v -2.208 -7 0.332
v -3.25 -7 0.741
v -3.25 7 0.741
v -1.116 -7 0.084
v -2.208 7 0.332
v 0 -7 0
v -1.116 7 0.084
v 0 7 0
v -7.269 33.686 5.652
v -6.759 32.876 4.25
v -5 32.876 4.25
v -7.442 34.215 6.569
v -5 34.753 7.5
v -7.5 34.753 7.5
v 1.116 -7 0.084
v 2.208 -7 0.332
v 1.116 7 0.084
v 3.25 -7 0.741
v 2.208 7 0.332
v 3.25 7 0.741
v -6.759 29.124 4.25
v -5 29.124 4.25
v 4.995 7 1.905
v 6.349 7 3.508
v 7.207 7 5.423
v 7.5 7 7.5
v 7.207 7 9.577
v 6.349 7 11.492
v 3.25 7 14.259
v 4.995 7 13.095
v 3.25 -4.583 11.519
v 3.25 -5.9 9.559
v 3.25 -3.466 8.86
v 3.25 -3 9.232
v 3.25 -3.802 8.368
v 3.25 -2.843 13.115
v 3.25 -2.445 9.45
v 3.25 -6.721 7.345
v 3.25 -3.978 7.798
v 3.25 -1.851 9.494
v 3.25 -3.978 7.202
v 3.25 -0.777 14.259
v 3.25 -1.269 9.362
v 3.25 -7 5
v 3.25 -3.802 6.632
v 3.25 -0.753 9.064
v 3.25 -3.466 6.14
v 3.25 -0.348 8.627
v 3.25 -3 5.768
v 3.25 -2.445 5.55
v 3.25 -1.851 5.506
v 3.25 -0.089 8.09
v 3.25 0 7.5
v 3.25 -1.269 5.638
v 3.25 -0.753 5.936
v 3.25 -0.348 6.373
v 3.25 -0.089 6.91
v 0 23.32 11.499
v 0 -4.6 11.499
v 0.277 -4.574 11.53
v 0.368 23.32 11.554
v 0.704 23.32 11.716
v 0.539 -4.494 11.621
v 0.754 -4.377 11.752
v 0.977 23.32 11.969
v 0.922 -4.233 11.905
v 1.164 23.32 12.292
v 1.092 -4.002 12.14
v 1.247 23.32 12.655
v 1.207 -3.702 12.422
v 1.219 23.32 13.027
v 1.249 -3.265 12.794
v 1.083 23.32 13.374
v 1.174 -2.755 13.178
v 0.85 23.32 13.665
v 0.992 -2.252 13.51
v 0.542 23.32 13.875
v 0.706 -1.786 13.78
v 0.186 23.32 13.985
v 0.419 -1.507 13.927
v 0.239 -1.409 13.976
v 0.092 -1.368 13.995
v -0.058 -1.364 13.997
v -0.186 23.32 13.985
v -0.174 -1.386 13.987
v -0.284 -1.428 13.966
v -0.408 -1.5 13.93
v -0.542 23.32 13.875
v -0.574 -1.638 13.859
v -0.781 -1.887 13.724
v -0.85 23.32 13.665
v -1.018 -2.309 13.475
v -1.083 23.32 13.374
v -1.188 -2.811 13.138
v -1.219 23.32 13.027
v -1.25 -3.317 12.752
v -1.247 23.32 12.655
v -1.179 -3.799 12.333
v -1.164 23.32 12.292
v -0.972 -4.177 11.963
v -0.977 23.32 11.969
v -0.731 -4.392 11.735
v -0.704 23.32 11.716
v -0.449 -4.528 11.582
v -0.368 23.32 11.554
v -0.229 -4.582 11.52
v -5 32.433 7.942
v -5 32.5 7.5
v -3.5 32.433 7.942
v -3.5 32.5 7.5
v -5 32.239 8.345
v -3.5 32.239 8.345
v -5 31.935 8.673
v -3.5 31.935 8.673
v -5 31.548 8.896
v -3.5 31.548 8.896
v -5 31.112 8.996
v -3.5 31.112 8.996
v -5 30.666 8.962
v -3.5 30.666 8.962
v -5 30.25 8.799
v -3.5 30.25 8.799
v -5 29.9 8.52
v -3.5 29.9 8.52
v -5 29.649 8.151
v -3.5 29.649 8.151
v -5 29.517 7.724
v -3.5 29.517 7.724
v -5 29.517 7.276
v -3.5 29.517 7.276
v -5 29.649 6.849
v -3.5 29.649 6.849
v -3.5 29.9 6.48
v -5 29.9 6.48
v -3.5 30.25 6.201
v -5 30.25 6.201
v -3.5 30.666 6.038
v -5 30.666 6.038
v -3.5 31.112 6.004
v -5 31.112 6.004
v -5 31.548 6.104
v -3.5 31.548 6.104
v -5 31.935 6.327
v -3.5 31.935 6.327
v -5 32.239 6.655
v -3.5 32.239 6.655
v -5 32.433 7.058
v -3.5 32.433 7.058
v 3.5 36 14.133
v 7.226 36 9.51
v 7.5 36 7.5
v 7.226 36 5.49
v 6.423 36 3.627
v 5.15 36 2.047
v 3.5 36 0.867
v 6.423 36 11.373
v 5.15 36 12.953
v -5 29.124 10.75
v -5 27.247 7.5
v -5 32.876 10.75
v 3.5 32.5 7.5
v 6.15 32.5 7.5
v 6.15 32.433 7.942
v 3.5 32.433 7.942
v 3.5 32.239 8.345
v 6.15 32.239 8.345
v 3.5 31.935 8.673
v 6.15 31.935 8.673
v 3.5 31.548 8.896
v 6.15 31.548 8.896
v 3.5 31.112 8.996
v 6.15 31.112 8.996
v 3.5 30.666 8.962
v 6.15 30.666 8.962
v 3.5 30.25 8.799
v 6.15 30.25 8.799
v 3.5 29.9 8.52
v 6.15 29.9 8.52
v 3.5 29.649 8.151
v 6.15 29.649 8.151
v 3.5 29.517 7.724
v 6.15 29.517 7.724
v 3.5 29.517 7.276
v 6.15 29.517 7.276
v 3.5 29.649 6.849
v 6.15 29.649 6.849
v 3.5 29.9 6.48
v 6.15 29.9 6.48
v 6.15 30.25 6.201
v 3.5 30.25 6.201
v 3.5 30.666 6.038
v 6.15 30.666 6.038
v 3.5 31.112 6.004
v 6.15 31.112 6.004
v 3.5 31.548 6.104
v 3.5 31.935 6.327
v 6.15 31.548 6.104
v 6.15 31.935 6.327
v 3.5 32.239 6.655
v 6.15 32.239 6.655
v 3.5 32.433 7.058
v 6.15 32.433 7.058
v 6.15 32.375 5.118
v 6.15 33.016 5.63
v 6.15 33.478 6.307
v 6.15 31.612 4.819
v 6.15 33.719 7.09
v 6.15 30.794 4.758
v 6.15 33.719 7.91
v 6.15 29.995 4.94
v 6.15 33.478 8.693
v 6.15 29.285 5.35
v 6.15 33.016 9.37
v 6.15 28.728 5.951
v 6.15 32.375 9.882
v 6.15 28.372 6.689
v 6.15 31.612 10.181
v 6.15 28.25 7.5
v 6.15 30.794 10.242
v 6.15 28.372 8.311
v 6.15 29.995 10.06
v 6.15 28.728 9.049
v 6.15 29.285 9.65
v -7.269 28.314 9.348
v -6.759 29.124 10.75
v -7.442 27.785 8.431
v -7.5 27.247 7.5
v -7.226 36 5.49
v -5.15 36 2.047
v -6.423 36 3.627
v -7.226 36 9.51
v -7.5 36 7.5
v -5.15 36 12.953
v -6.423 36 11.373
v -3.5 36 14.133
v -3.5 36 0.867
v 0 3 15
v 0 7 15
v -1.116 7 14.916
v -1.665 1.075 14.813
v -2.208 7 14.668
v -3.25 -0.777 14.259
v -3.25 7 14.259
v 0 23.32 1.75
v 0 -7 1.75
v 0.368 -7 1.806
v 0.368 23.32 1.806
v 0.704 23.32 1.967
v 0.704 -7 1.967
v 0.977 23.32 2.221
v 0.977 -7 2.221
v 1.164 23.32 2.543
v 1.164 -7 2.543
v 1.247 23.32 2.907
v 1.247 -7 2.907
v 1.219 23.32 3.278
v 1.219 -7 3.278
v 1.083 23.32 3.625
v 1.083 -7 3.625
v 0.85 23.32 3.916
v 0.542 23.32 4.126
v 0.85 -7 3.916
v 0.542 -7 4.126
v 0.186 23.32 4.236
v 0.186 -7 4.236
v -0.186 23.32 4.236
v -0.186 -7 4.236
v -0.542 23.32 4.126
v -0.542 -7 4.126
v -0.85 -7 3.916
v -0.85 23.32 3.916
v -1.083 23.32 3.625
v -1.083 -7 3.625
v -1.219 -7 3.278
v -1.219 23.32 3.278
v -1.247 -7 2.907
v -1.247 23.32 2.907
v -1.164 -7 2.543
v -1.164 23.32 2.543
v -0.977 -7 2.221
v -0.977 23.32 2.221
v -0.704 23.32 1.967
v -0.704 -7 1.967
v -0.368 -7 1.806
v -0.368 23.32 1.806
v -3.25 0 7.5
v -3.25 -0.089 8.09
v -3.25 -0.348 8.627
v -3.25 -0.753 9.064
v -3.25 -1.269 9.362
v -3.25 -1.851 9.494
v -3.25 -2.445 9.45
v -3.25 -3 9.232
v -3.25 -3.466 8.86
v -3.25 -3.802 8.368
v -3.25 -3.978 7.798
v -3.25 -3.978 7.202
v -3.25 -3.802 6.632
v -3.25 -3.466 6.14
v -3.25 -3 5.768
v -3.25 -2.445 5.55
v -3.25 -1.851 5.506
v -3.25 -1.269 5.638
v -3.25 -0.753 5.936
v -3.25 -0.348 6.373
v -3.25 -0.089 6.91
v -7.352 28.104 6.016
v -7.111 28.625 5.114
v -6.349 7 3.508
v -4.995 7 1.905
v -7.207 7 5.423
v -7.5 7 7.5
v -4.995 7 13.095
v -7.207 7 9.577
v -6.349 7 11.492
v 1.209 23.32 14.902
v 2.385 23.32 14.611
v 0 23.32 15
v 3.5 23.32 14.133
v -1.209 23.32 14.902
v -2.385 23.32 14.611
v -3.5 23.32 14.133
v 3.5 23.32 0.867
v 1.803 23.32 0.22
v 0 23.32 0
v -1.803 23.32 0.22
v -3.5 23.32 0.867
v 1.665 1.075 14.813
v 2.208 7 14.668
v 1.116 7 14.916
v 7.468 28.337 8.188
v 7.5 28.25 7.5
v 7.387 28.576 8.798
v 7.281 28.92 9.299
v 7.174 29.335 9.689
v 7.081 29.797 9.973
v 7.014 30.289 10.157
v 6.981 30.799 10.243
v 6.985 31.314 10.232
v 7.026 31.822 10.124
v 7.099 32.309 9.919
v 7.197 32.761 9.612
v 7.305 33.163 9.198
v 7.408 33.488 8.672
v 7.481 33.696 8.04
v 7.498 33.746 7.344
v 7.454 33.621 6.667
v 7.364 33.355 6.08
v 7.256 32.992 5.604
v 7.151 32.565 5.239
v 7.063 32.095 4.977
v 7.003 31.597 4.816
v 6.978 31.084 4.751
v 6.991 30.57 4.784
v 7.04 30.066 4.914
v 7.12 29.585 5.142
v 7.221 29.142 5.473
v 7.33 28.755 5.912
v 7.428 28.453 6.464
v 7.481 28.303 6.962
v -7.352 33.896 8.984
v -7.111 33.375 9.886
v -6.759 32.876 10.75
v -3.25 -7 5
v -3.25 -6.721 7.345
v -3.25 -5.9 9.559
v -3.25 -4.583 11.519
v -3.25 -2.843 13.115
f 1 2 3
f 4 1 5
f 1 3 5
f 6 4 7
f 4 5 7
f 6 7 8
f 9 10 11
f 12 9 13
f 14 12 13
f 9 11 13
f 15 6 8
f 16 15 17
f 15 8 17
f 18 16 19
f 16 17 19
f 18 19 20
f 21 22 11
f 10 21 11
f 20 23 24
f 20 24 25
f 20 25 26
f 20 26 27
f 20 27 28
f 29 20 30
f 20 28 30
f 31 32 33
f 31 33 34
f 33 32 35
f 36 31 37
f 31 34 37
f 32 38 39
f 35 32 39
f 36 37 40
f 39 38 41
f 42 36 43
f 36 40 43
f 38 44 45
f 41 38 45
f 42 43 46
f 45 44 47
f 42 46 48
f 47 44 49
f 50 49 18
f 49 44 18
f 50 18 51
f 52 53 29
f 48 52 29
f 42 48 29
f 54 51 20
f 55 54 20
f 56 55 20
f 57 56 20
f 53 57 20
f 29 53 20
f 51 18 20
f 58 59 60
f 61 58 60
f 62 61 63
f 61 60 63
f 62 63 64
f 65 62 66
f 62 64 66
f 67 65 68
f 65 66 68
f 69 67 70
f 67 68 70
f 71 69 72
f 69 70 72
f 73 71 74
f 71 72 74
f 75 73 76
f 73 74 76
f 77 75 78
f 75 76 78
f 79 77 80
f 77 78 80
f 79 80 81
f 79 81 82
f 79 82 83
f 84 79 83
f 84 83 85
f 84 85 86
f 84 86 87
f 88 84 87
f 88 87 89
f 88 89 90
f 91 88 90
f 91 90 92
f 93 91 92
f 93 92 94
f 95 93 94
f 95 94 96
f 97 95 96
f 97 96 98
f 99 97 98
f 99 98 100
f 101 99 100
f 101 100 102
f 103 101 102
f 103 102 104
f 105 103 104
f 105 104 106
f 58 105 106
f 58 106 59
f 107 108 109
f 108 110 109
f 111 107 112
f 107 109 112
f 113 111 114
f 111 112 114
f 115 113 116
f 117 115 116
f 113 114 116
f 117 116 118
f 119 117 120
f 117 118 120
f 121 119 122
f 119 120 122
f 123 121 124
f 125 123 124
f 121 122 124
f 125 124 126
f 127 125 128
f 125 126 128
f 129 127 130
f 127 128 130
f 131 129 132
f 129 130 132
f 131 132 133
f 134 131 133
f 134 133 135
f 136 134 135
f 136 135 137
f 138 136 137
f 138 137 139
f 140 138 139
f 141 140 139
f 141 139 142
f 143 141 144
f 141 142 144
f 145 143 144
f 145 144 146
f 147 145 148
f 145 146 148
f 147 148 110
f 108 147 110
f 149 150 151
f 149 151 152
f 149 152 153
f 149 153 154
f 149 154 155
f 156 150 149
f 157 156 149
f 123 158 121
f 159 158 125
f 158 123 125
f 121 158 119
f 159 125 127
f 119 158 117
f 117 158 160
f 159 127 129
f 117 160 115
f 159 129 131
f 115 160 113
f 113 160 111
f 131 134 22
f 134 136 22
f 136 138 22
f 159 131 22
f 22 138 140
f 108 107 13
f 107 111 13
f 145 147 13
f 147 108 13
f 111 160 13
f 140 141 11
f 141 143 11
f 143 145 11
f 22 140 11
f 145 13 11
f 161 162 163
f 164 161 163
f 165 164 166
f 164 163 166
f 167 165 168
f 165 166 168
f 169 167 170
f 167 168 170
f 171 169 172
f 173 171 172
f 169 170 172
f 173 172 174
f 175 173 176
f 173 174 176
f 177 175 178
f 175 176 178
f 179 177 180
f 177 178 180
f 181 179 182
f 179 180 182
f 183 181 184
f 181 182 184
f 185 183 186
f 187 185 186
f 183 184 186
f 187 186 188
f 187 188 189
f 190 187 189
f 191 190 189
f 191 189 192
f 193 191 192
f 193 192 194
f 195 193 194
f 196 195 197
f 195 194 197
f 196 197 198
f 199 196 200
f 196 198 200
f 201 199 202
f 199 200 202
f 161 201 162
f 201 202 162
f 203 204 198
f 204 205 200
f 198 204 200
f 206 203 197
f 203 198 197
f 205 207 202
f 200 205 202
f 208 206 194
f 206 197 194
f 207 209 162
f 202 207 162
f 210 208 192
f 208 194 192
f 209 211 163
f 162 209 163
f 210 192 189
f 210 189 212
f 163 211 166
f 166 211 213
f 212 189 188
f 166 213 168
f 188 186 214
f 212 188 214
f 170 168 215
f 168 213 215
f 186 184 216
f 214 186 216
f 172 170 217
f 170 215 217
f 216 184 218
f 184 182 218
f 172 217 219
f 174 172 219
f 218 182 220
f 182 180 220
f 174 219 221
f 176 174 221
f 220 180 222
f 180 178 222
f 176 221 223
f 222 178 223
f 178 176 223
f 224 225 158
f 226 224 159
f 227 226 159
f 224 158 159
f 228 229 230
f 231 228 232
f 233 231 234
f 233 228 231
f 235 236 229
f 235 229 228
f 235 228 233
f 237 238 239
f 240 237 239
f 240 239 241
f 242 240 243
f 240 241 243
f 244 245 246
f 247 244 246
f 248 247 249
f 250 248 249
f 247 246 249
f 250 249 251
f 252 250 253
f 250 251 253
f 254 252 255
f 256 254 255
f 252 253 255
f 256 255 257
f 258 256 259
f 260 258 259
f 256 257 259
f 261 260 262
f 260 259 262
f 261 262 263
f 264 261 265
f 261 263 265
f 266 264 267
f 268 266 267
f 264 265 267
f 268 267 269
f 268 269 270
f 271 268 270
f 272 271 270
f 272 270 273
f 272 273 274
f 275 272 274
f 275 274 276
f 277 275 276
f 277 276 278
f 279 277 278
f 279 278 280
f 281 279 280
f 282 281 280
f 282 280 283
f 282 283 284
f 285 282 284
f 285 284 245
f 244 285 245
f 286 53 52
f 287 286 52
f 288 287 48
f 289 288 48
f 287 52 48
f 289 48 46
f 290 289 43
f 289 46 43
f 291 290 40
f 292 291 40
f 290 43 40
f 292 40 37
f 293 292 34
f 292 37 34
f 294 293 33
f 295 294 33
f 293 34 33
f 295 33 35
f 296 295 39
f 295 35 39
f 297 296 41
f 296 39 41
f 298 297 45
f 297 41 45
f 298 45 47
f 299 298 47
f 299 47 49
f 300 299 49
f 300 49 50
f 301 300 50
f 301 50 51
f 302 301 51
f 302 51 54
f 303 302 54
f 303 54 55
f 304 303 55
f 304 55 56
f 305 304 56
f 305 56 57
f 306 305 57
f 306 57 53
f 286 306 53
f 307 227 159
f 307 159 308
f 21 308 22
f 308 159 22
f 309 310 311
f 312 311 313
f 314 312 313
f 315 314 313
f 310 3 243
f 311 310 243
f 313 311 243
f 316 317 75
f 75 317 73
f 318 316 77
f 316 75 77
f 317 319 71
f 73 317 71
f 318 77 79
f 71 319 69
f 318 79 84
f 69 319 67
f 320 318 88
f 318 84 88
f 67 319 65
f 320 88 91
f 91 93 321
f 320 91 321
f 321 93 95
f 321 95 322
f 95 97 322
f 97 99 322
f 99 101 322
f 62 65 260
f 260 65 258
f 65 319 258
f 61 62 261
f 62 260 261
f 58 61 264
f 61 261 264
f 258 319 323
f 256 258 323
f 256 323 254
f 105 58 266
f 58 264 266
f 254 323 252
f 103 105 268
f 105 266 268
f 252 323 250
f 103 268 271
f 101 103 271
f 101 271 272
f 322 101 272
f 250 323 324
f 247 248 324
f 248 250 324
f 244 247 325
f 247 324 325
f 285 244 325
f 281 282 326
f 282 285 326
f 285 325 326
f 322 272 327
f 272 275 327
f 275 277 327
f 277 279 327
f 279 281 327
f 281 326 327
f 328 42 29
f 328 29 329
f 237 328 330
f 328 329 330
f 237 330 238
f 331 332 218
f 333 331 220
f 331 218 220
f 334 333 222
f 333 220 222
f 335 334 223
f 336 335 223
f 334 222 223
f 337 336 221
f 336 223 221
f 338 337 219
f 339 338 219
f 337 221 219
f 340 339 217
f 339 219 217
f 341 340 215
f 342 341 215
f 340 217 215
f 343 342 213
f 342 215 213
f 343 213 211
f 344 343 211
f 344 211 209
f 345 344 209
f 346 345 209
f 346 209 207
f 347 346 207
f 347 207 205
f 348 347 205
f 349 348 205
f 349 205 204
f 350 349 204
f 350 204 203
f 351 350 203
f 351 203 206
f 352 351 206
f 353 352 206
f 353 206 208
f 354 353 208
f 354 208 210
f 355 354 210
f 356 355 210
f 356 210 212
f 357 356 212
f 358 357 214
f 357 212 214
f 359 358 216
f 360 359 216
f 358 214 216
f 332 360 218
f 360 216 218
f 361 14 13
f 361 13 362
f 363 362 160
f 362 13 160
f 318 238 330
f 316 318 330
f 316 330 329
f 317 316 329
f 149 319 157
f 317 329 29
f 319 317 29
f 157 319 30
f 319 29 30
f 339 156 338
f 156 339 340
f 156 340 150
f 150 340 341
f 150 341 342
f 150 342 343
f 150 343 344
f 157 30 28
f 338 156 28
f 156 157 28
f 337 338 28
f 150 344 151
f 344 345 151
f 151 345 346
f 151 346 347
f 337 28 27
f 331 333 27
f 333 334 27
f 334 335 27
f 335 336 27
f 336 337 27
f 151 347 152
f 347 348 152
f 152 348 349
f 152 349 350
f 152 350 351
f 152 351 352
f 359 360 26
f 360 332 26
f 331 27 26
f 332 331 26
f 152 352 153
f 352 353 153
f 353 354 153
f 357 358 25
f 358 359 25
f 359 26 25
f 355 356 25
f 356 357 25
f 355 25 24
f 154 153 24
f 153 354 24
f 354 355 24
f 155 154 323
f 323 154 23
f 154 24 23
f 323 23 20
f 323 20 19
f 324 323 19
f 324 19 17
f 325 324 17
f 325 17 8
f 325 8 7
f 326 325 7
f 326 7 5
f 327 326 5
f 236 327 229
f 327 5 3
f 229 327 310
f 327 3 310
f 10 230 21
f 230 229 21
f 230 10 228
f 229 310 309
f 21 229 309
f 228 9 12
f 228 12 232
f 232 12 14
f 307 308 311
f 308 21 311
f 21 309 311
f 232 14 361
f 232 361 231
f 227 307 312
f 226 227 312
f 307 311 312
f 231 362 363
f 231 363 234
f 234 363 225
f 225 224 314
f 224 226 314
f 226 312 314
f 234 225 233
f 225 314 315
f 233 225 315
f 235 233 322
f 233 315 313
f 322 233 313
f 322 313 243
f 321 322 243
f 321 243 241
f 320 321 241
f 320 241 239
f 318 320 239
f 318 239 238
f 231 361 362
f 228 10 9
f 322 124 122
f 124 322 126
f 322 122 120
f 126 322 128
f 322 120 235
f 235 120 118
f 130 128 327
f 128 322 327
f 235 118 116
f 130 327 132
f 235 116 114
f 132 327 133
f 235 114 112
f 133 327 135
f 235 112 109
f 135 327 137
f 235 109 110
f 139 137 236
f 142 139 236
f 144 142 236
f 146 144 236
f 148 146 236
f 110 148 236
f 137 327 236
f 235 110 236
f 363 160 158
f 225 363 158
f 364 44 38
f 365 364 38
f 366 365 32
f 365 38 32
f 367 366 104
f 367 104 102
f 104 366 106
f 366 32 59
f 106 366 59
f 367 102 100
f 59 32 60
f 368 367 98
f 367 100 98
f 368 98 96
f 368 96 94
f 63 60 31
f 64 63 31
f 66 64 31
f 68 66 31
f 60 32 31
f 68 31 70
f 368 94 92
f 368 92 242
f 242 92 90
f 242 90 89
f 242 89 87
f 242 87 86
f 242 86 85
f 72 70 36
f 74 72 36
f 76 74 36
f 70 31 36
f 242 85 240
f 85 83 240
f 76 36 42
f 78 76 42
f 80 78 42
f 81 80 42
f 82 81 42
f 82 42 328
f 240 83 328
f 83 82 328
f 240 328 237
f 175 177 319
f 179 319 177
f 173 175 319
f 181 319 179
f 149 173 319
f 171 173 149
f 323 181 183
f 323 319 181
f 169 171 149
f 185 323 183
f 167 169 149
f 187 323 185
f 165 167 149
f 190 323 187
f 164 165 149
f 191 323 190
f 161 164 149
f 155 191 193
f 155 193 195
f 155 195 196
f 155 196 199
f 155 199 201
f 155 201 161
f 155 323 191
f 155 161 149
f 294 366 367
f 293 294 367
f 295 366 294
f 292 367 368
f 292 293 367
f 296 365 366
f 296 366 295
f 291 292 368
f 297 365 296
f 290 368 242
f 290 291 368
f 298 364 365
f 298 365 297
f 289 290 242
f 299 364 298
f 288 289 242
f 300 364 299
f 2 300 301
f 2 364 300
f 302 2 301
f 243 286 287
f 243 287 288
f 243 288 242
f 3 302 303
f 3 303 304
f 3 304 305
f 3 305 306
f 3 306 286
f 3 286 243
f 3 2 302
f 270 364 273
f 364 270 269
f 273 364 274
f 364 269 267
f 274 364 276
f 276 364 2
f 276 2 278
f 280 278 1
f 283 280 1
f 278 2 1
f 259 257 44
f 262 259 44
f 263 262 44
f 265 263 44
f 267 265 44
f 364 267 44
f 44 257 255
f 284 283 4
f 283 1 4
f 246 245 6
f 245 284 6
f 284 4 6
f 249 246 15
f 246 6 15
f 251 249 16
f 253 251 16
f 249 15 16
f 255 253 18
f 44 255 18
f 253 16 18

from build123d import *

# Parameters (mm, degrees)
SKETCH1_W           = 6.5
SKETCH1_H           = 14
BOSS_EXTRUDE1_DEPTH = 15
FILLET1_R           = 10
SKETCH2_R           = 2
CUT_EXTRUDE1_DEPTH  = 18.783419244
SKETCH4_R           = 7.5
BOSS_EXTRUDE2_DEPTH = 29
SKETCH6_W           = 7
SKETCH6_H           = 12.68
CUT_EXTRUDE2_DEPTH  = 40.714606885
CUT_EXTRUDE3_DEPTH  = 34.5
SKETCH8_R           = 1.5
CUT_EXTRUDE4_DEPTH  = 21
SKETCH9_R           = 2.75
CUT_EXTRUDE5_DEPTH  = 10
CUT_EXTRUDE6_DEPTH  = 10
SKETCH11_R          = 1.25
CUT_EXTRUDE7_DEPTH  = 40


with BuildPart() as part:
    # Sketch1 → Boss-Extrude1 (new body)
    with BuildSketch(Plane.XY):
        Rectangle(SKETCH1_W, SKETCH1_H)
    extrude(amount=BOSS_EXTRUDE1_DEPTH)

    # Fillet1
    fillet1_edges = [part.edges().sort_by_distance(p)[0] for p in [
        (0, -7, 15),
    ]]
    fillet(fillet1_edges, radius=FILLET1_R)

    # Sketch2 → Cut-Extrude1 (cut, through all)
    with BuildSketch(Plane(origin=(3.25, 0, 0), x_dir=(0, 0, -1), z_dir=(1, 0, 0))):
        with Locations((-7.5, -2)):
            Circle(SKETCH2_R)
    extrude(amount=-CUT_EXTRUDE1_DEPTH, mode=Mode.SUBTRACT)

    # Sketch4 → Boss-Extrude2 (add)
    with BuildSketch(Plane(origin=(0, 7, 0), x_dir=(1, 0, 0), z_dir=(0, 1, 0))):
        with Locations((0, -7.5)):
            Circle(SKETCH4_R)
    extrude(amount=BOSS_EXTRUDE2_DEPTH)

    # Sketch6 → Cut-Extrude2 (cut, through all)
    with BuildSketch(Plane(origin=(0, 0, 0), x_dir=(-1, 0, 0), z_dir=(0, 0, -1))):
        with Locations((0, 29.66)):
            Rectangle(SKETCH6_W, SKETCH6_H)
    extrude(amount=-CUT_EXTRUDE2_DEPTH, mode=Mode.SUBTRACT)

    # Sketch7 → Cut-Extrude3 (cut, through all)
    with BuildSketch(Plane(origin=(0, 7, 0), x_dir=(1, 0, 0), z_dir=(0, 1, 0))):
        with BuildLine():
            ThreePointArc((0, -15), (-1.666673801, -14.812468697), (-3.25, -14.259252917))
            Line((-3.25, -14.259252917), (-3.25, -15))
            Line((-3.25, -15), (0, -15))
        make_face()
        with BuildLine():
            ThreePointArc((3.25, -14.259252917), (1.666673801, -14.812468697), (0, -15))
            Line((0, -15), (3.25, -15))
            Line((3.25, -15), (3.25, -14.259252917))
        make_face()
        with BuildLine():
            ThreePointArc((-3.25, -0.740747083), (-1.666673801, -0.187531303), (0, 0))
            Line((0, 0), (-3.25, 0))
            Line((-3.25, 0), (-3.25, -0.740747083))
        make_face()
        with BuildLine():
            Line((3.25, 0), (0, 0))
            ThreePointArc((0, 0), (1.666673801, -0.187531303), (3.25, -0.740747083))
            Line((3.25, -0.740747083), (3.25, 0))
        make_face()
    extrude(amount=-CUT_EXTRUDE3_DEPTH, mode=Mode.SUBTRACT)

    # Sketch8 → Cut-Extrude4 (cut, symmetric)
    with BuildSketch(Plane(origin=(-3.5, 0, 0), x_dir=(0, 0, -1), z_dir=(1, 0, 0))):
        with Locations((-7.5, 31)):
            Circle(SKETCH8_R)
    extrude(amount=CUT_EXTRUDE4_DEPTH, both=True, mode=Mode.SUBTRACT)

    # Sketch9 → Cut-Extrude5 (cut)
    with BuildSketch(Plane.ZY.offset(-6.15)):
        with Locations((7.5, 31)):
            Circle(SKETCH9_R)
    extrude(amount=-CUT_EXTRUDE5_DEPTH, mode=Mode.SUBTRACT)

    # Sketch10 → Cut-Extrude6 (cut)
    with BuildSketch(Plane(origin=(-5, 0, 0), x_dir=(0, 0, -1), z_dir=(1, 0, 0))):
        Polygon((-7.5, 34.75277675), (-10.75, 32.876388375), (-10.75, 29.123611625), (-7.5, 27.24722325), (-4.25, 29.123611625), (-4.25, 32.876388375), align=None)
    extrude(amount=-CUT_EXTRUDE6_DEPTH, mode=Mode.SUBTRACT)

    # Sketch11 → Cut-Extrude7 (cut)
    with BuildSketch(Plane.XZ.offset(7)):
        with Locations((0, 3)):
            Circle(SKETCH11_R)
        with Locations((0, 12.74882624)):
            Circle(SKETCH11_R)
    extrude(amount=-CUT_EXTRUDE7_DEPTH, mode=Mode.SUBTRACT)


solid = part.part
